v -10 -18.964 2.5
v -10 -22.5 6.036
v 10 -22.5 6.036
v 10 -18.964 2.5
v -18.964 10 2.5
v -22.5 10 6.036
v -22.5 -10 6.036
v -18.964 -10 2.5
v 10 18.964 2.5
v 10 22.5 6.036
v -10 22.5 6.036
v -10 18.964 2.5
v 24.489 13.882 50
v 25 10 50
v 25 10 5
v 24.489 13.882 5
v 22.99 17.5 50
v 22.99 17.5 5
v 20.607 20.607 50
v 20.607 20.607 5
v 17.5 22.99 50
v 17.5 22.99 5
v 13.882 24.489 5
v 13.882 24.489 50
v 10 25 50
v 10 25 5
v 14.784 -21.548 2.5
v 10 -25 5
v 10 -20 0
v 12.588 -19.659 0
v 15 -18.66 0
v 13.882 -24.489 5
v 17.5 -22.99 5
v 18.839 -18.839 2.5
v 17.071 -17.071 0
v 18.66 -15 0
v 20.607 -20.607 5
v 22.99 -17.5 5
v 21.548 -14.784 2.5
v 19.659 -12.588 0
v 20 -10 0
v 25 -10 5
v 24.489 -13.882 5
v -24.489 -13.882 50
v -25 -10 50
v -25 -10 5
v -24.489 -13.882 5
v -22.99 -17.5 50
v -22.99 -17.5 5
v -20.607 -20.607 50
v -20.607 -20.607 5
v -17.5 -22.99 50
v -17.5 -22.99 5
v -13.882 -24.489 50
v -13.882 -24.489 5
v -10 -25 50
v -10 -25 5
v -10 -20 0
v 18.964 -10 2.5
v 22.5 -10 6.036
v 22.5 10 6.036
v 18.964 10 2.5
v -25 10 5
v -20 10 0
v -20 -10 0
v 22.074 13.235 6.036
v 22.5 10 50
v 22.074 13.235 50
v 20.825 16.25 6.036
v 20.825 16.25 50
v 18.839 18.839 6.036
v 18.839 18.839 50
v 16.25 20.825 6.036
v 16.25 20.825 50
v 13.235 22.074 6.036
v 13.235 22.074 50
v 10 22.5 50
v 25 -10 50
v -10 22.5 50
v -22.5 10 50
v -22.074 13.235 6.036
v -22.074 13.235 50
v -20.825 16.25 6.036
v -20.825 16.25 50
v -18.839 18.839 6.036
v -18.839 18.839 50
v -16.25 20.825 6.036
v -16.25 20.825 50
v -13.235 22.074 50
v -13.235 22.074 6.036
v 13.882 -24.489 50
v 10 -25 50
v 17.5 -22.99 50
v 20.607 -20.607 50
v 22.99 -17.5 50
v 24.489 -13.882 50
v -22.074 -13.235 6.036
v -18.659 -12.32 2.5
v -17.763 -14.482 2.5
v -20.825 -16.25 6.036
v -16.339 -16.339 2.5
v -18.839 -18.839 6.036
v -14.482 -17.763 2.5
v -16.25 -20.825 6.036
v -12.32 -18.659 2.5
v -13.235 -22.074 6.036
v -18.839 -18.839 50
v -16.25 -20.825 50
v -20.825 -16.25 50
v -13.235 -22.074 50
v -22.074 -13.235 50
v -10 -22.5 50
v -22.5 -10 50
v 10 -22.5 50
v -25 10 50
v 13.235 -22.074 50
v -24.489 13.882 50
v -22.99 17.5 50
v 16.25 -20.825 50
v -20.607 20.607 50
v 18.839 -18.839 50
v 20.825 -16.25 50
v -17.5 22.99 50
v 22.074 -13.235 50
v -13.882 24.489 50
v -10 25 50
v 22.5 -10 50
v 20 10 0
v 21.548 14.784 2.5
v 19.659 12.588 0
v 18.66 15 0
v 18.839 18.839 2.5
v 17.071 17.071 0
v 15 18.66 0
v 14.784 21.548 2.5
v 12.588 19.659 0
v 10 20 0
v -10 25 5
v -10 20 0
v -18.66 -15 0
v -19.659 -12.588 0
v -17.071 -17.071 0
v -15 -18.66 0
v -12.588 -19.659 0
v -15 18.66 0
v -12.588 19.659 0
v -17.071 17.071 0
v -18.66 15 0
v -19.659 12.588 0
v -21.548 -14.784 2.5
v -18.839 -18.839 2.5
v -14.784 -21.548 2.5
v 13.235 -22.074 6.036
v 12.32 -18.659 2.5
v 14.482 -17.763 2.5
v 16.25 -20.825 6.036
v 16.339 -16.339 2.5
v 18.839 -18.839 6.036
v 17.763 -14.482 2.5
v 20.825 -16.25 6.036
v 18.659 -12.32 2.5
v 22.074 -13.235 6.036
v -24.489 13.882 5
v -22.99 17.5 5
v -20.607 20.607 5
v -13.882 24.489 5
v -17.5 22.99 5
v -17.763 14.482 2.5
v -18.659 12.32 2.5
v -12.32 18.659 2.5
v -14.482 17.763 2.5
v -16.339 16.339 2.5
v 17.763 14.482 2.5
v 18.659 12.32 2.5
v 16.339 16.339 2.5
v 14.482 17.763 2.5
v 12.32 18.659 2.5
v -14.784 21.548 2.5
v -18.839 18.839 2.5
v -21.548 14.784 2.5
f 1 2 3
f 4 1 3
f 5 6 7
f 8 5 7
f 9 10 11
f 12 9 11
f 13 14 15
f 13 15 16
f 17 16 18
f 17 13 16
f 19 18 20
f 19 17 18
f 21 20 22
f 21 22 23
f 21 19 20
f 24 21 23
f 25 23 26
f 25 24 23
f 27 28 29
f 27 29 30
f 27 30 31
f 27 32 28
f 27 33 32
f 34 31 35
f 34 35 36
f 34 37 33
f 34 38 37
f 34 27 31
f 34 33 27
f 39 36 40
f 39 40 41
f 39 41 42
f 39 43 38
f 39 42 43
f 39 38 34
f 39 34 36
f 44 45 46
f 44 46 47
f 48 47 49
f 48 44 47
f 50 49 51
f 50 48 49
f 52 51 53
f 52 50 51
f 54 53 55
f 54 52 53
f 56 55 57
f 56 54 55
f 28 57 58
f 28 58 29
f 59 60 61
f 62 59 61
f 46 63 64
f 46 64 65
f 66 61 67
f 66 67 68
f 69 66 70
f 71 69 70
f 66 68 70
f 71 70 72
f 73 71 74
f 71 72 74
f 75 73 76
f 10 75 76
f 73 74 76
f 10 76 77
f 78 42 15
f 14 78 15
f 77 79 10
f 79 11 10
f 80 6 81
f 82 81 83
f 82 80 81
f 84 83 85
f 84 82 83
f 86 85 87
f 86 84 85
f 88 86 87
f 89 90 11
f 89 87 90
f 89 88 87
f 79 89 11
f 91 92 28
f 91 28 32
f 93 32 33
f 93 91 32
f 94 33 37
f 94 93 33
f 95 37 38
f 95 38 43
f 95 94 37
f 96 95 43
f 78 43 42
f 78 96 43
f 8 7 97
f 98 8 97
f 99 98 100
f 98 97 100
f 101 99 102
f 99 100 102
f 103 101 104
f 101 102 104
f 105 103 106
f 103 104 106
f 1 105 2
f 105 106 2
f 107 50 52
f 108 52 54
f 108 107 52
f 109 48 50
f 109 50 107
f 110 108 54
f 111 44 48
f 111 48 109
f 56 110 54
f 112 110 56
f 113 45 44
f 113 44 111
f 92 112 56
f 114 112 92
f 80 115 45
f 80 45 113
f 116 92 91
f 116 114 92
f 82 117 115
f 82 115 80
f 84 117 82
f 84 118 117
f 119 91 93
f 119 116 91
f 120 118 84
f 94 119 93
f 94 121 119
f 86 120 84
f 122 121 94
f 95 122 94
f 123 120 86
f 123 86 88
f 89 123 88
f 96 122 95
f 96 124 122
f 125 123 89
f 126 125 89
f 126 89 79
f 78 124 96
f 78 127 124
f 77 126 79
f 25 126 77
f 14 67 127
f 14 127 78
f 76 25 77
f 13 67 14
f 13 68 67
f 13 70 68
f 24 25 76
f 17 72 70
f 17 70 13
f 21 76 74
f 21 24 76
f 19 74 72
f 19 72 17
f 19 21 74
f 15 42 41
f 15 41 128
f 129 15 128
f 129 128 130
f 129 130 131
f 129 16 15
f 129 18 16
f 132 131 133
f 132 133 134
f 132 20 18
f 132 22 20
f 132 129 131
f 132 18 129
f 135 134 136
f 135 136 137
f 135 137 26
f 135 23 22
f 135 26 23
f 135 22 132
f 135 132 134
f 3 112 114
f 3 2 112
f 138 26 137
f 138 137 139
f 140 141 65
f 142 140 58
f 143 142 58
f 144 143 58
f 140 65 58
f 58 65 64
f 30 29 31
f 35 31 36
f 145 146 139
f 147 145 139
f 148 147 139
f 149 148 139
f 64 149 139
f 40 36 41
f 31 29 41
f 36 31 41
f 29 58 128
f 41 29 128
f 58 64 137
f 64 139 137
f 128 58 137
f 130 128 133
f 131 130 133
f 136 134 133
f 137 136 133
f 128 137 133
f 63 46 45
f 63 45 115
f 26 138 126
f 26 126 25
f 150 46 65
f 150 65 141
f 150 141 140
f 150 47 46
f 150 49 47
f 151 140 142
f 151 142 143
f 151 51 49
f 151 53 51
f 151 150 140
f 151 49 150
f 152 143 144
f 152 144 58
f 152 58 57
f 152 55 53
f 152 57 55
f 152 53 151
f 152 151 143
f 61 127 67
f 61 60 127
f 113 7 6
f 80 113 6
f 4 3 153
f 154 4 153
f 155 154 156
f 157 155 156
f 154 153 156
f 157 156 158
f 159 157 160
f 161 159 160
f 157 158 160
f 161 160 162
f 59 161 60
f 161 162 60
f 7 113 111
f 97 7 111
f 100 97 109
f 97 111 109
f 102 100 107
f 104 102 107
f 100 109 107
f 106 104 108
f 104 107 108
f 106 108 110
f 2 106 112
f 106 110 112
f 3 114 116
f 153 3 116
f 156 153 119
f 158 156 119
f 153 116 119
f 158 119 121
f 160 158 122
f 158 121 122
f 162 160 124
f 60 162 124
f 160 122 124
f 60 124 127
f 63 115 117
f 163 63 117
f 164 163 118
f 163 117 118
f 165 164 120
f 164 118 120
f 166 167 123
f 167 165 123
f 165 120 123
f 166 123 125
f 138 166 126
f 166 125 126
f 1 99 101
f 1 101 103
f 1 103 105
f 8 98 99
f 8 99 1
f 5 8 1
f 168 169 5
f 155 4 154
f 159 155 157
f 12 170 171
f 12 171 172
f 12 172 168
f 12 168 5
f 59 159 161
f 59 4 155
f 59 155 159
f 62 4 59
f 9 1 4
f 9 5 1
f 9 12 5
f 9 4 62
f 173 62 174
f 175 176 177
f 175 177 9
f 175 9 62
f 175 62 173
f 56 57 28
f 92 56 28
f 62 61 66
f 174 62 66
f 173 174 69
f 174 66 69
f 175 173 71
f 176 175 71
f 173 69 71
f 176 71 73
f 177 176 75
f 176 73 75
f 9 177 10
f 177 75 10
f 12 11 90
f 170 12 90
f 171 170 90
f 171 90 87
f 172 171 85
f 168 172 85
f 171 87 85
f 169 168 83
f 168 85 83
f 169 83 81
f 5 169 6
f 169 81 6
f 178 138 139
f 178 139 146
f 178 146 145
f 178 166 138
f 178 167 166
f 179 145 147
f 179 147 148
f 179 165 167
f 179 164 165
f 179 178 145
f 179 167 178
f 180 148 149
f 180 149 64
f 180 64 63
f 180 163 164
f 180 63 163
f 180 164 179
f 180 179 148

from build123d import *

# Parameters (mm, degrees)
F0_W     = 50
F0_H     = 50
F1_DEPTH = 50
F2_R     = 15
F3_SIZE  = 5
F4_T     = -2.5


with BuildPart() as f1:
    # F0 (on Top) → F1 (new body)
    with BuildSketch(Plane.XY):
        Rectangle(F0_W, F0_H)
    extrude(amount=F1_DEPTH)

    # F2
    f2_edges = [f1.edges().sort_by_distance(p)[0] for p in [
        (-25, -25, 25),
        (25, -25, 25),
        (25, 25, 25),
        (-25, 25, 25),
    ]]
    fillet(f2_edges, radius=F2_R)

    # F3
    f3_edges = [f1.edges().sort_by_distance(p)[0] for p in [
        (20.606602, 20.606602, 0),
        (20.606602, -20.606602, 0),
        (-20.606602, -20.606602, 0),
        (-20.606602, 20.606602, 0),
    ]]
    chamfer(f3_edges, length=F3_SIZE)

    # F4
    f4_openings = [f1.faces().sort_by_distance(p)[0] for p in [
        (0, 0, 50),
    ]]
    offset(amount=F4_T, openings=f4_openings)


solid = f1.part
